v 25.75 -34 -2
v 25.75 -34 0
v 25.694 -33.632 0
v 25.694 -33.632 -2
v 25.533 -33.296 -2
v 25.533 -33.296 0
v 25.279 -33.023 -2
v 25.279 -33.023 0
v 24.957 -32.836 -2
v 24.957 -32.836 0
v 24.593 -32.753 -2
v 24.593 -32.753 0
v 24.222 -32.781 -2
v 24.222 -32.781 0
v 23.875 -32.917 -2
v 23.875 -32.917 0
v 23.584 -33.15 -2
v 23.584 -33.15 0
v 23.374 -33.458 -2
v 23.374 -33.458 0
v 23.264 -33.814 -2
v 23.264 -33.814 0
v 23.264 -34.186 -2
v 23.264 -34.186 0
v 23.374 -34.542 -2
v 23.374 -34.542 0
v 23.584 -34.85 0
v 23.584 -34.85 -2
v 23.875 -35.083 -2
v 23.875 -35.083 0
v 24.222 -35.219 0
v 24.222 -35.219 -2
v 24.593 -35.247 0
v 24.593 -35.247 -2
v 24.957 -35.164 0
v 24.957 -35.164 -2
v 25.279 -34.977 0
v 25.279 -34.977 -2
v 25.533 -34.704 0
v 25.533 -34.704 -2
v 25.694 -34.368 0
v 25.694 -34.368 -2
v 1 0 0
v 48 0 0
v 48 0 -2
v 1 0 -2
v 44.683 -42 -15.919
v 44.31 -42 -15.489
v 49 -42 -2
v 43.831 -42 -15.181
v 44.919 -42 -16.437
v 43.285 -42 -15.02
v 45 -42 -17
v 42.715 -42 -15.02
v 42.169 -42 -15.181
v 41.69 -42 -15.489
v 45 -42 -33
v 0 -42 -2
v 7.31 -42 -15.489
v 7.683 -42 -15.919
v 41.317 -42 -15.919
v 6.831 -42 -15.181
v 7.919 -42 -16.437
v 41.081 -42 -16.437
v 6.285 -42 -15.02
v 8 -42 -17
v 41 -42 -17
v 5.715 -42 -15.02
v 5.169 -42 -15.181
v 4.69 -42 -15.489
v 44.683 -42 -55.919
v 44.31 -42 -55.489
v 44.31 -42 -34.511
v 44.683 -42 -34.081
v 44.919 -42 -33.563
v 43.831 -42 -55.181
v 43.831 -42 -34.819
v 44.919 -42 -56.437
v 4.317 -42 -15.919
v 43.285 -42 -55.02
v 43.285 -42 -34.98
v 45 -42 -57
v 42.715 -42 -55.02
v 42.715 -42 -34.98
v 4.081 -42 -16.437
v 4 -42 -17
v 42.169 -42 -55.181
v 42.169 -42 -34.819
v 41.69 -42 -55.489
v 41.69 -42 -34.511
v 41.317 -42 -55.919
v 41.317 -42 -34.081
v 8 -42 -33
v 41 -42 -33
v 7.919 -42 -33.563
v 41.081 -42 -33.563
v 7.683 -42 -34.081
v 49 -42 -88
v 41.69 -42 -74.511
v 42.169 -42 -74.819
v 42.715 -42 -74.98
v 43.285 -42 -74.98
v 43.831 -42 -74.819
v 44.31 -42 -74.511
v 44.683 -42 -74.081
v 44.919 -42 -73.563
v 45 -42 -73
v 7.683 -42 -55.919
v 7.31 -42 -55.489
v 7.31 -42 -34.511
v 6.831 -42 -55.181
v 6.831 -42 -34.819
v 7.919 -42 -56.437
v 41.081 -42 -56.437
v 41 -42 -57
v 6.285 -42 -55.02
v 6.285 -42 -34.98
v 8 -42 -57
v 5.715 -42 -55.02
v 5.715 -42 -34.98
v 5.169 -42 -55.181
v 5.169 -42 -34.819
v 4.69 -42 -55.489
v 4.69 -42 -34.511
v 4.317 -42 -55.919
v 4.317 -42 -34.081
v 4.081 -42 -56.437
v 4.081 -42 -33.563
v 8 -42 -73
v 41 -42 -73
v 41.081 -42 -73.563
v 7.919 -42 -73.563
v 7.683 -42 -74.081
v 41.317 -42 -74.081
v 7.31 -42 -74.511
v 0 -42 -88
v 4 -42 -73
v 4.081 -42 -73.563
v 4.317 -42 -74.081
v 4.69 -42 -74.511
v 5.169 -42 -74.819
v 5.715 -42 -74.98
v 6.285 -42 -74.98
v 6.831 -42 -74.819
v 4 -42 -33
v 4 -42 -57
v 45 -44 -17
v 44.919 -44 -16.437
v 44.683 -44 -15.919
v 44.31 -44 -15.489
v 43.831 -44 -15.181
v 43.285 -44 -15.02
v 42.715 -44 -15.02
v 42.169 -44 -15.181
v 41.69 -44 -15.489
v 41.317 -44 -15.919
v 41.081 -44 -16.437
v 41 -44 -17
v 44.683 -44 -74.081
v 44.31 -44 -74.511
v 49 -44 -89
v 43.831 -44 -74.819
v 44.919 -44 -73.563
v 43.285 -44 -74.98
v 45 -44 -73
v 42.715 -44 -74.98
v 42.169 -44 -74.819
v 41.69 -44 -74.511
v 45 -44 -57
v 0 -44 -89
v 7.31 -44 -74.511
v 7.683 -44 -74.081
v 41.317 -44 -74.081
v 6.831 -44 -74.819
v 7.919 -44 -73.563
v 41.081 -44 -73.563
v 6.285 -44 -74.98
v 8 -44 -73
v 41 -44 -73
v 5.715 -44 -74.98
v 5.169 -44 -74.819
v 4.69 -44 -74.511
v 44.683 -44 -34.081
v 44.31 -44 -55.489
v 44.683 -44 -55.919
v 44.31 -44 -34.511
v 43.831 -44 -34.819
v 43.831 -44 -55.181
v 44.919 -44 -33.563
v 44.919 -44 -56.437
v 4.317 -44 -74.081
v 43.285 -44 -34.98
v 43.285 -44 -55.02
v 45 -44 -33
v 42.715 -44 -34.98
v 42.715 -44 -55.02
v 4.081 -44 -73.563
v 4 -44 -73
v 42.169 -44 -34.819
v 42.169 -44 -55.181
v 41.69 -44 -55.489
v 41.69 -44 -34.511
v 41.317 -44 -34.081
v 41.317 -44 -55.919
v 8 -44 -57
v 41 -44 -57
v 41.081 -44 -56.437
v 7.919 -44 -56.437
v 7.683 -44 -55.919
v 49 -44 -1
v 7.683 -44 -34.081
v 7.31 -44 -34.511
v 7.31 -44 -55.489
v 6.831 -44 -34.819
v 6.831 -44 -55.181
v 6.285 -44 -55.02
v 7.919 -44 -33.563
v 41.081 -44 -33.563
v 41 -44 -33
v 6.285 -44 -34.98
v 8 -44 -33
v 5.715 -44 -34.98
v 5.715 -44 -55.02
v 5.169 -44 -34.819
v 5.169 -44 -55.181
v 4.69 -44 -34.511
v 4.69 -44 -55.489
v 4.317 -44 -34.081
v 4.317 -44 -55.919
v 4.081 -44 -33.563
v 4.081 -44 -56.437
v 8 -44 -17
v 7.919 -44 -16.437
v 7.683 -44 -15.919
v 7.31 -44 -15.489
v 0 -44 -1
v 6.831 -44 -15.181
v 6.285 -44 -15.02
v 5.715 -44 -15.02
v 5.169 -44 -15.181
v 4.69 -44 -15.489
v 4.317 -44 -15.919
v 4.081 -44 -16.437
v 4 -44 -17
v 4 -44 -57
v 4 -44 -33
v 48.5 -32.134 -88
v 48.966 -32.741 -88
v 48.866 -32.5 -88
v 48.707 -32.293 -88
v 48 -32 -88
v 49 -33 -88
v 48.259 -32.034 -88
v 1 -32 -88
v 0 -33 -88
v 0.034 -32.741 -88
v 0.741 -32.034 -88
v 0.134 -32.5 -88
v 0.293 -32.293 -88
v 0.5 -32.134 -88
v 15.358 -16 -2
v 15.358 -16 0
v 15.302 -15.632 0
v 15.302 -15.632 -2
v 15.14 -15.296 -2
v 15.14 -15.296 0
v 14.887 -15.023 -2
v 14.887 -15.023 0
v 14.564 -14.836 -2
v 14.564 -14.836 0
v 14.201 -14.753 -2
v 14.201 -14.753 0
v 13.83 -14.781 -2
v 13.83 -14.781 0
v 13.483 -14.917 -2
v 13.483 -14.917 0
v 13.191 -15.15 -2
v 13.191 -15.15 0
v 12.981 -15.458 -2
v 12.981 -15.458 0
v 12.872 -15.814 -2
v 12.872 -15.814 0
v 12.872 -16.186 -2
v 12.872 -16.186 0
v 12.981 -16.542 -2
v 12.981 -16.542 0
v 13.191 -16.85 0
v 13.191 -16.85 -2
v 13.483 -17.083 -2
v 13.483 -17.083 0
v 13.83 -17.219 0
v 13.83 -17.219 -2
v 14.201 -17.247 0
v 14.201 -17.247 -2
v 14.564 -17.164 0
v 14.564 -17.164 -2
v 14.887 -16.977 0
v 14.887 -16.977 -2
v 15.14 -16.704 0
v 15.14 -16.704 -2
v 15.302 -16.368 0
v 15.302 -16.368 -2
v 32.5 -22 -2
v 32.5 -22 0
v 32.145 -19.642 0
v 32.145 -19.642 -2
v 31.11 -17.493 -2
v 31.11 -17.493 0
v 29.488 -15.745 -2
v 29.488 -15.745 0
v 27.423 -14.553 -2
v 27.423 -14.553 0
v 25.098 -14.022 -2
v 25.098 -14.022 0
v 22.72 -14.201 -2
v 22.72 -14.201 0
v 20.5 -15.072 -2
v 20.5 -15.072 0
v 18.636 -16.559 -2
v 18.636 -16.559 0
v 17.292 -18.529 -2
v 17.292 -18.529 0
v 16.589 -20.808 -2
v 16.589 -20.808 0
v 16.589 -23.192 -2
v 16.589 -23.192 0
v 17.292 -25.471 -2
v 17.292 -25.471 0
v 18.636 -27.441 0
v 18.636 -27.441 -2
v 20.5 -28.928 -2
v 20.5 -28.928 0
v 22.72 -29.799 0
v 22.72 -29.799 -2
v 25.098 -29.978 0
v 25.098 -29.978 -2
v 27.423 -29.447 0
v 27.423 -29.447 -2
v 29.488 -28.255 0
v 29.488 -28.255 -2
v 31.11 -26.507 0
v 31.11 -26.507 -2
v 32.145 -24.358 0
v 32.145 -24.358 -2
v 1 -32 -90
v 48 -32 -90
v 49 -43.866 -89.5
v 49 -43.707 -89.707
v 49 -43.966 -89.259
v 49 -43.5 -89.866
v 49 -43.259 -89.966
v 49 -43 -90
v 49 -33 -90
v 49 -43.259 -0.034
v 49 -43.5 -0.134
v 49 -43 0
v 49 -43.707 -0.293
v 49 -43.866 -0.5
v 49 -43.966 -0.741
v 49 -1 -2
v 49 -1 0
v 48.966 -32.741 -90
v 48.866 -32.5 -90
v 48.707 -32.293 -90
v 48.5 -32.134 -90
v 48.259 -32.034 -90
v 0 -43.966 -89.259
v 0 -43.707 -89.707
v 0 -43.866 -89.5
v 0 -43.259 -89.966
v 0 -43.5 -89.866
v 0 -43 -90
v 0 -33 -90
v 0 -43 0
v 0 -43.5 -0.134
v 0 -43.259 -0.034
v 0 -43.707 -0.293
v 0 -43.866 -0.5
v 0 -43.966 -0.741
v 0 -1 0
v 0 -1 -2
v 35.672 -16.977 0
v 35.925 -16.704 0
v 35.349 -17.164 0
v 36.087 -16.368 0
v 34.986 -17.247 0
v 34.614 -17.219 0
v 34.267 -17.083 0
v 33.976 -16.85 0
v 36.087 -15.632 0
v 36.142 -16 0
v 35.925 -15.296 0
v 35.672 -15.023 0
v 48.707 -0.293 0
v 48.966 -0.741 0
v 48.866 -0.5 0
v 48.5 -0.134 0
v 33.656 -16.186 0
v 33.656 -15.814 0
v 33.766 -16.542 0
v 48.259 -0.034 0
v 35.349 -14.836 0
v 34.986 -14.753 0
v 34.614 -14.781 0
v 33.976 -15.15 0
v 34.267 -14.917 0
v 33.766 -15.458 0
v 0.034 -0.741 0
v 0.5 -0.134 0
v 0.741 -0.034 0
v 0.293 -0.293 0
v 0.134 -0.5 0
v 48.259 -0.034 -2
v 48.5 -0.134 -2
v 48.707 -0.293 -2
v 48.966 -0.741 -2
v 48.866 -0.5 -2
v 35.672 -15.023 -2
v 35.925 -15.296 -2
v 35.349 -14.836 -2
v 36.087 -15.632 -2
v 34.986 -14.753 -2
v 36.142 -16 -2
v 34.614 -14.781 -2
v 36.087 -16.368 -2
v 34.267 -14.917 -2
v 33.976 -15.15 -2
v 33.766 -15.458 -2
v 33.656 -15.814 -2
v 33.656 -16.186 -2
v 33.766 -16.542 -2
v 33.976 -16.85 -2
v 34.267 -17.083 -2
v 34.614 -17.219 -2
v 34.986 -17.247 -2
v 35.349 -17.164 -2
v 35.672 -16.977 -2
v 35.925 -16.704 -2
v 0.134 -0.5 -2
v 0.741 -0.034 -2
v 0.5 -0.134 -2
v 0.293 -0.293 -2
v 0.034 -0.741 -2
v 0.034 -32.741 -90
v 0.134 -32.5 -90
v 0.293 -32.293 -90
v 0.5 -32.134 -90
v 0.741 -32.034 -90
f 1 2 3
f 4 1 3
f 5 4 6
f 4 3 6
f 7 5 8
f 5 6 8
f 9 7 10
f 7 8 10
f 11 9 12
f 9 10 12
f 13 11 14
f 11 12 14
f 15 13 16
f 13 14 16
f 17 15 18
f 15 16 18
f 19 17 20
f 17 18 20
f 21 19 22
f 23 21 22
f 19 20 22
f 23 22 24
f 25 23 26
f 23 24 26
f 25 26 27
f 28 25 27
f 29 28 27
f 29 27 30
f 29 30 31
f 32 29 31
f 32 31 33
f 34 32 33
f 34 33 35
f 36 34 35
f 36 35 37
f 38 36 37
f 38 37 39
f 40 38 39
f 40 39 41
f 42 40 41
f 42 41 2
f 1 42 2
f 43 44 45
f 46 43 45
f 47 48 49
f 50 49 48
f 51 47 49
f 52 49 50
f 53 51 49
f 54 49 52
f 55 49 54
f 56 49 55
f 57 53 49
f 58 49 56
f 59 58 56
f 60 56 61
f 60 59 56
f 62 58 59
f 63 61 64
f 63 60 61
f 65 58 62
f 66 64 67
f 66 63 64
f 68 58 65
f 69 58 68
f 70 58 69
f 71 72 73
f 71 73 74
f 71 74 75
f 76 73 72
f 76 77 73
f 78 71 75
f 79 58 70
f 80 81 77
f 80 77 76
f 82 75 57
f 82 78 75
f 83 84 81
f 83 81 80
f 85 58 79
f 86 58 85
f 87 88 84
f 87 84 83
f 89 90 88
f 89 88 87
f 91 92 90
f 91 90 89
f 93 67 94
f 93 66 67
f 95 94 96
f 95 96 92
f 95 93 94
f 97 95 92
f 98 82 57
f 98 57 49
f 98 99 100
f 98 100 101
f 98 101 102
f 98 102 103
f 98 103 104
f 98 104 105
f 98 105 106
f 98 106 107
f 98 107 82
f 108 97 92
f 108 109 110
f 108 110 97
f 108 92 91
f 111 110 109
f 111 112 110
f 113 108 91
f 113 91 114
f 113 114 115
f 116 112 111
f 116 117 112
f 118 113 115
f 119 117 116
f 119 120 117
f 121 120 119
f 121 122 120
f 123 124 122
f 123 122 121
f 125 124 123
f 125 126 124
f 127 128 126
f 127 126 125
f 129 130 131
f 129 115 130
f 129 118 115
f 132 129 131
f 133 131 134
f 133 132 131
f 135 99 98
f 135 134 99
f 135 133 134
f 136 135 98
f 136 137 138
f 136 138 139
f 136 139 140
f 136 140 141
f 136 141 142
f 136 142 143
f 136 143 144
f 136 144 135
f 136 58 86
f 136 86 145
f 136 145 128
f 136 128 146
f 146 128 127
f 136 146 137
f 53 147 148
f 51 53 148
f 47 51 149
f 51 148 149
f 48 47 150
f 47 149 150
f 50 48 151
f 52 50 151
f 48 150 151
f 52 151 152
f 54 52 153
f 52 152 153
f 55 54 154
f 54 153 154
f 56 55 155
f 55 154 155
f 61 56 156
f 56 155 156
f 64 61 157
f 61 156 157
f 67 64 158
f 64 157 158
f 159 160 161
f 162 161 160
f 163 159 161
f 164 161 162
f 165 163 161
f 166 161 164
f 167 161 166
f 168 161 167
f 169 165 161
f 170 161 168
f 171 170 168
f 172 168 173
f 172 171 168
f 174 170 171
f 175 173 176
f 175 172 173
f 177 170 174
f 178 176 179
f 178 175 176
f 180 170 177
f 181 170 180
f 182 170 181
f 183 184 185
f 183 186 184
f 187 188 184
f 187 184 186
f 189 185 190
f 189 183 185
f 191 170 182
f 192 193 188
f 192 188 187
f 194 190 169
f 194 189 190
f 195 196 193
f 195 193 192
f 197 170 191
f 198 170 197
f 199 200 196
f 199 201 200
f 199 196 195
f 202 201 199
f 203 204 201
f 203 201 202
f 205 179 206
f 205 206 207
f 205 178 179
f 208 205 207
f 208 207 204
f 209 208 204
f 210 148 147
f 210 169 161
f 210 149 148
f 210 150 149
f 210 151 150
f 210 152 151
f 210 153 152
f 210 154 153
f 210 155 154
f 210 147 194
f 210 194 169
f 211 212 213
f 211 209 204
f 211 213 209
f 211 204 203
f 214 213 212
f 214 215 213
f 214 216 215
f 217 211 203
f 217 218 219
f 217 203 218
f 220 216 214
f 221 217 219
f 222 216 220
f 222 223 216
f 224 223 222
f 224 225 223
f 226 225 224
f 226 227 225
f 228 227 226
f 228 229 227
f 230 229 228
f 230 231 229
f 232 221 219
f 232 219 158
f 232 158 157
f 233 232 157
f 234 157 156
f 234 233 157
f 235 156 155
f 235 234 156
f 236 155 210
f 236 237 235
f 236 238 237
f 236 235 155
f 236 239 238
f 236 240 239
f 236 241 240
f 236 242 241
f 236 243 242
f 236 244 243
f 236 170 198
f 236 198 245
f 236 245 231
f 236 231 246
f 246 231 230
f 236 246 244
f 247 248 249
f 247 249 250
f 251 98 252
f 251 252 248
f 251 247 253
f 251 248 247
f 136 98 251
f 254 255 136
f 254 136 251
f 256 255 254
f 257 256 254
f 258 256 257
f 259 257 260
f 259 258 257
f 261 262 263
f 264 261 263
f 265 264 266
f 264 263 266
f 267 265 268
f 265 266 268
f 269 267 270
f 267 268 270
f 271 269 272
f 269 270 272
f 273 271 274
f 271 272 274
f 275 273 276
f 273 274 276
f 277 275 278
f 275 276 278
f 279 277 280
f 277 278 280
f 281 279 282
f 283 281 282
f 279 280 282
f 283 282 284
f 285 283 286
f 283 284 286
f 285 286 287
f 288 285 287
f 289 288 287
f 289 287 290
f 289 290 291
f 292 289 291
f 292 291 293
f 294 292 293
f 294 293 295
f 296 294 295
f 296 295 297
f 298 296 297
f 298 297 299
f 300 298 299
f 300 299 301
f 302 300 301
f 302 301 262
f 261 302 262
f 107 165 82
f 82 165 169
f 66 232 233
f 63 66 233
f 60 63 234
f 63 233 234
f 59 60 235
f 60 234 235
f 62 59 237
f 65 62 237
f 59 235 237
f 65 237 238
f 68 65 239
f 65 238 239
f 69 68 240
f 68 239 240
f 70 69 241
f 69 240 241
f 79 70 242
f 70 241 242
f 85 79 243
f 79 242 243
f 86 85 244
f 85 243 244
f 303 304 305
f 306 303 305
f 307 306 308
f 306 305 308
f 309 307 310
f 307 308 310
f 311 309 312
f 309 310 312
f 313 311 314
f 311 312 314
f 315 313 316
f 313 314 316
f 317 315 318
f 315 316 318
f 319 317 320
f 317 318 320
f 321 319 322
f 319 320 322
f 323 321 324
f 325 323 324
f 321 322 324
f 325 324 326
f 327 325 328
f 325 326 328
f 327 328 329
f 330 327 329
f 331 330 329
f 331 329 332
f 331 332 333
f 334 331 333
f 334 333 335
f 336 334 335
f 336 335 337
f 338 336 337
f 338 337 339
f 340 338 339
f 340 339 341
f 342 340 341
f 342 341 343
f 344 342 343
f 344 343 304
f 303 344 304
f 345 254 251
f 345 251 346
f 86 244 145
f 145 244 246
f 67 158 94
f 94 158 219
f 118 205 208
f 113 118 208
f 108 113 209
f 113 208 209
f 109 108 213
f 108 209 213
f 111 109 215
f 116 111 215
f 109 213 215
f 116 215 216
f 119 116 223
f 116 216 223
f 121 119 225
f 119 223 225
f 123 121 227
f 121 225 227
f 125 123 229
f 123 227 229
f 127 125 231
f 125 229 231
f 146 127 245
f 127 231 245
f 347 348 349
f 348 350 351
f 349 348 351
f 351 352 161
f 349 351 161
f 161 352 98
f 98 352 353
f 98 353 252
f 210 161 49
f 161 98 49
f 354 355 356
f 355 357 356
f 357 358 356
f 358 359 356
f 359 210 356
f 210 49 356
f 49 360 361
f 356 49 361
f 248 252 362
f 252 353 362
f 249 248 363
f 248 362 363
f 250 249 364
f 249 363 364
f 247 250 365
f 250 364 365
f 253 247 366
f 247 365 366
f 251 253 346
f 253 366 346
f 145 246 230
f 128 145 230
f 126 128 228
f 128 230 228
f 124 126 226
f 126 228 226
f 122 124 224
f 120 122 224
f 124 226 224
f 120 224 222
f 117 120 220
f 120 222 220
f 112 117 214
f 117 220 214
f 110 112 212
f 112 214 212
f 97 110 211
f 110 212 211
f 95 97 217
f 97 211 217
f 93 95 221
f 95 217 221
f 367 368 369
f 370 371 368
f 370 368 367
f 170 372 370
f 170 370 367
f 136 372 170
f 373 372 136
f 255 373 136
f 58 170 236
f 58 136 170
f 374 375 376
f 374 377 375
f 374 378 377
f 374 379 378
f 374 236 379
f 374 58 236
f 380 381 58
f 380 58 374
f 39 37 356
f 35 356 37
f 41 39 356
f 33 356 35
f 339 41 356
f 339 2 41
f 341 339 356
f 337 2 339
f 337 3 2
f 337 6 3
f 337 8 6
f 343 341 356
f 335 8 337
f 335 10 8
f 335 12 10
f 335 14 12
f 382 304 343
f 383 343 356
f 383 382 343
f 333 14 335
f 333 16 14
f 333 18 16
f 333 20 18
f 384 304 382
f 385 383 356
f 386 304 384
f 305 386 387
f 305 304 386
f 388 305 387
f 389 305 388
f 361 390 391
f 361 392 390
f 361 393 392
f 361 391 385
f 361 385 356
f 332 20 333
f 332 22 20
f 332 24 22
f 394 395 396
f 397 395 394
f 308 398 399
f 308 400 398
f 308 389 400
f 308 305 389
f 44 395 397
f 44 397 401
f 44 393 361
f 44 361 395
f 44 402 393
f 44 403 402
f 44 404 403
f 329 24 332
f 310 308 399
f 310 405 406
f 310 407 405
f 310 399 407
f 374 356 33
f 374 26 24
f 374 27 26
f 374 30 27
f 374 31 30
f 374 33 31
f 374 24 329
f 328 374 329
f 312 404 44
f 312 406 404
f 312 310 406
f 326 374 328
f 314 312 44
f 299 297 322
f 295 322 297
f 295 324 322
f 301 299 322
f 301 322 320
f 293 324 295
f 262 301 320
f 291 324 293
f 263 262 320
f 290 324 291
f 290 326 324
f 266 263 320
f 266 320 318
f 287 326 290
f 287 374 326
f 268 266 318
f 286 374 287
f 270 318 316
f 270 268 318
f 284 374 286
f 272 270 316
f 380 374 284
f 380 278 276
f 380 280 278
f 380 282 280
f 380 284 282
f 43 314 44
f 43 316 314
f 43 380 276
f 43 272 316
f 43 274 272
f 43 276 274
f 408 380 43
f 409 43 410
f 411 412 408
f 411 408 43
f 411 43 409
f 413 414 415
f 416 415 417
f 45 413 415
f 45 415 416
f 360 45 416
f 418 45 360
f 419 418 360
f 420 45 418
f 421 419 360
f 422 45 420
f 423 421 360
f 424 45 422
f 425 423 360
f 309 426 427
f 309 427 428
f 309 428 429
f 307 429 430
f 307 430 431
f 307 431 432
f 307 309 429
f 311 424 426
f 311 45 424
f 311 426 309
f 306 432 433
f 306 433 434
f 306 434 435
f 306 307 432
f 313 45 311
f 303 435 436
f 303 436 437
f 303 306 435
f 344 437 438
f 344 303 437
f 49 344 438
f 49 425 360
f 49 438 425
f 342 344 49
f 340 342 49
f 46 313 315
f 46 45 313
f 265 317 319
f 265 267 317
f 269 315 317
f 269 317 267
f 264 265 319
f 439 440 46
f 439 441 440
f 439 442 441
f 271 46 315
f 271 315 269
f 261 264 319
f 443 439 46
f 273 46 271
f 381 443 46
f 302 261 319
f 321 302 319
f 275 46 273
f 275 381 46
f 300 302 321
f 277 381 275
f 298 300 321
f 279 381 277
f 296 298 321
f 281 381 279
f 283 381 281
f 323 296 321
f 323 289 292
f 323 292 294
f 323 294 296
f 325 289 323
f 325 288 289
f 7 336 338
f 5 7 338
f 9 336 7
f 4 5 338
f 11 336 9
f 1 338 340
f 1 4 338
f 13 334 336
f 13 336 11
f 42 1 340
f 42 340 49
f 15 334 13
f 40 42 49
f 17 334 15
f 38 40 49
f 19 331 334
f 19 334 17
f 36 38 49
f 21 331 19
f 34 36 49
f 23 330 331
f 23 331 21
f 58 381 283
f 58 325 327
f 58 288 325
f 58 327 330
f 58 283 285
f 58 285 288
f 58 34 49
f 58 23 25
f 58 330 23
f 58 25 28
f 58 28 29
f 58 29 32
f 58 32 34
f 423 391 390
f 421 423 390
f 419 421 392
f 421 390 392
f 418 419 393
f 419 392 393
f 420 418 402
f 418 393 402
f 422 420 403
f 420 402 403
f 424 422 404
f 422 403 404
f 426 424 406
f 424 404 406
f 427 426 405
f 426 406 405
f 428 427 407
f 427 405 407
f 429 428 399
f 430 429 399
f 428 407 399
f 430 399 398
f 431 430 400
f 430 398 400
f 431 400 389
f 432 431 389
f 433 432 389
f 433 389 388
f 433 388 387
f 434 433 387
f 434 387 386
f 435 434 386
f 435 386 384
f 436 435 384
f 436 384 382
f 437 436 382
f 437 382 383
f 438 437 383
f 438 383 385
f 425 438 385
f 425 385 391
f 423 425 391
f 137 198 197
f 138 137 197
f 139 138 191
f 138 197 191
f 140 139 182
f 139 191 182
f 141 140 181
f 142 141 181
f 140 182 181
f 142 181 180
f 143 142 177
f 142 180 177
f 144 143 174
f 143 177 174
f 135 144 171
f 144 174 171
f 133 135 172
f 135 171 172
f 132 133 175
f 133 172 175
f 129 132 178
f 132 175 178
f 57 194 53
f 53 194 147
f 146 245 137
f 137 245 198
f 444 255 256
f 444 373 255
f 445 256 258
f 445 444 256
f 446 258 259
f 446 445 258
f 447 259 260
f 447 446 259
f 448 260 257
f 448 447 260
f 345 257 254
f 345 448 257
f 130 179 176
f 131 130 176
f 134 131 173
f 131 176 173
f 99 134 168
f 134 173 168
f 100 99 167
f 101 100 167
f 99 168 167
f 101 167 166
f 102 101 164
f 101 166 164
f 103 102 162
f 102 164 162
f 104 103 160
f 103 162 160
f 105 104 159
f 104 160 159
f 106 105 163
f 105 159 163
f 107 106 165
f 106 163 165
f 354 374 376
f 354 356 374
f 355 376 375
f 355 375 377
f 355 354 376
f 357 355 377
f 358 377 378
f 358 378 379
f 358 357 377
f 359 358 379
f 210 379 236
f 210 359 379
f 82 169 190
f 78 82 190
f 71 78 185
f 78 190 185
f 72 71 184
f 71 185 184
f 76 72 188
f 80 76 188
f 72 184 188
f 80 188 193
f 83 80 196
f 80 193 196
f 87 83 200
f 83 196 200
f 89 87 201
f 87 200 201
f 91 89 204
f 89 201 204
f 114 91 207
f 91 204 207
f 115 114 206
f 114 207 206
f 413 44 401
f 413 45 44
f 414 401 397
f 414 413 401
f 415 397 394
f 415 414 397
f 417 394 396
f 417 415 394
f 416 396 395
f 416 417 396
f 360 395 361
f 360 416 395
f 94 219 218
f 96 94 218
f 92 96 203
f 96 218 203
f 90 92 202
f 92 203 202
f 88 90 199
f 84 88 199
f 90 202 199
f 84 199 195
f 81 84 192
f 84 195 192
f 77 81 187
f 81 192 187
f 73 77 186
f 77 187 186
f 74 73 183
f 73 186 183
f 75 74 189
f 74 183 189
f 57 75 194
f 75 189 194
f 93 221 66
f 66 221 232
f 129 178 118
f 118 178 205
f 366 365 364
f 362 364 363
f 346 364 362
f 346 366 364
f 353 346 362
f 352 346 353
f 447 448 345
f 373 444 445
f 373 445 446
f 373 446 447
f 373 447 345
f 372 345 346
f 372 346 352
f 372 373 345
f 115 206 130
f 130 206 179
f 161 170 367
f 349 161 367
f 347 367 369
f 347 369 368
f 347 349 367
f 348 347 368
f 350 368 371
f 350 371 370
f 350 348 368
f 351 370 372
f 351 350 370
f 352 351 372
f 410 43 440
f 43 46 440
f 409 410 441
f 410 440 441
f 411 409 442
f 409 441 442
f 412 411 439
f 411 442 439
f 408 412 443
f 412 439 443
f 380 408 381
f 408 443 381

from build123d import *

# Parameters (mm, degrees)
BOSS_EXTRUDE2_DEPTH = 49
CUT_EXTRUDE1_REACH  = 113.521
SKETCH4_R           = 1.25
SKETCH4_R_2         = 8
CUT_EXTRUDE3_REACH  = 113.521
FILLET2_R           = 1


with BuildPart() as part:
    # Sketch3 → Boss-Extrude2 (new body)
    with BuildSketch(Plane(origin=(0, 0, 0), x_dir=(0, 0, -1), z_dir=(1, 0, 0))):
        Polygon((0, 0), (2, 0), (2, -42), (88, -42), (88, -32), (90, -32), (90, -44), (0, -44), align=None)
    extrude(amount=BOSS_EXTRUDE2_DEPTH)

    # Sketch4 → Cut-Extrude1 (cut, up to next)
    with BuildSketch(Plane.XY, mode=Mode.PRIVATE) as cut_extrude1_sk1:
        with Locations((24.5, -34)):
            Circle(SKETCH4_R)
    cut_extrude1_tool1 = extrude(cut_extrude1_sk1.sketch, amount=-CUT_EXTRUDE1_REACH, mode=Mode.PRIVATE) & part.part
    # Sketch4 → Cut-Extrude1 (cut, up to next)
    with BuildSketch(Plane.XY, mode=Mode.PRIVATE) as cut_extrude1_sk2:
        with Locations((14.107695155, -16)):
            Circle(SKETCH4_R)
    cut_extrude1_tool2 = extrude(cut_extrude1_sk2.sketch, amount=-CUT_EXTRUDE1_REACH, mode=Mode.PRIVATE) & part.part
    # Sketch4 → Cut-Extrude1 (cut, up to next)
    with BuildSketch(Plane.XY, mode=Mode.PRIVATE) as cut_extrude1_sk3:
        with Locations((34.892304845, -16)):
            Circle(SKETCH4_R)
    cut_extrude1_tool3 = extrude(cut_extrude1_sk3.sketch, amount=-CUT_EXTRUDE1_REACH, mode=Mode.PRIVATE) & part.part
    # Sketch4 → Cut-Extrude1 (cut, up to next)
    with BuildSketch(Plane.XY, mode=Mode.PRIVATE) as cut_extrude1_sk4:
        with Locations((24.5, -22)):
            Circle(SKETCH4_R_2)
    cut_extrude1_tool4 = extrude(cut_extrude1_sk4.sketch, amount=-CUT_EXTRUDE1_REACH, mode=Mode.PRIVATE) & part.part
    add(cut_extrude1_tool1.solids().sort_by_distance((24.5, -34, 0))[0], mode=Mode.SUBTRACT)
    add(cut_extrude1_tool2.solids().sort_by_distance((14.107695, -16, 0))[0], mode=Mode.SUBTRACT)
    add(cut_extrude1_tool3.solids().sort_by_distance((34.892305, -16, 0))[0], mode=Mode.SUBTRACT)
    add(cut_extrude1_tool4.solids().sort_by_distance((24.5, -22, 0))[0], mode=Mode.SUBTRACT)

    # Sketch5 → Cut-Extrude3 (cut, up to next)
    with BuildSketch(Plane.XZ.offset(44), mode=Mode.PRIVATE) as cut_extrude3_sk1:
        with BuildLine():
            Line((41, -17), (41, -33))
            ThreePointArc((41, -33), (43, -35), (45, -33))
            Line((45, -33), (45, -17))
            ThreePointArc((45, -17), (43, -15), (41, -17))
        make_face()
    cut_extrude3_tool1 = extrude(cut_extrude3_sk1.sketch, amount=-CUT_EXTRUDE3_REACH, mode=Mode.PRIVATE) & part.part
    # Sketch5 → Cut-Extrude3 (cut, up to next)
    with BuildSketch(Plane.XZ.offset(44), mode=Mode.PRIVATE) as cut_extrude3_sk2:
        with BuildLine():
            Line((45, -73), (45, -57))
            ThreePointArc((45, -57), (43, -55), (41, -57))
            Line((41, -57), (41, -73))
            ThreePointArc((41, -73), (43, -75), (45, -73))
        make_face()
    cut_extrude3_tool2 = extrude(cut_extrude3_sk2.sketch, amount=-CUT_EXTRUDE3_REACH, mode=Mode.PRIVATE) & part.part
    # Sketch5 → Cut-Extrude3 (cut, up to next)
    with BuildSketch(Plane.XZ.offset(44), mode=Mode.PRIVATE) as cut_extrude3_sk3:
        with BuildLine():
            Line((8, -73), (8, -57))
            ThreePointArc((8, -57), (6, -55), (4, -57))
            Line((4, -57), (4, -73))
            ThreePointArc((4, -73), (6, -75), (8, -73))
        make_face()
    cut_extrude3_tool3 = extrude(cut_extrude3_sk3.sketch, amount=-CUT_EXTRUDE3_REACH, mode=Mode.PRIVATE) & part.part
    # Sketch5 → Cut-Extrude3 (cut, up to next)
    with BuildSketch(Plane.XZ.offset(44), mode=Mode.PRIVATE) as cut_extrude3_sk4:
        with BuildLine():
            Line((4, -17), (4, -33))
            ThreePointArc((4, -33), (6, -35), (8, -33))
            Line((8, -33), (8, -17))
            ThreePointArc((8, -17), (6, -15), (4, -17))
        make_face()
    cut_extrude3_tool4 = extrude(cut_extrude3_sk4.sketch, amount=-CUT_EXTRUDE3_REACH, mode=Mode.PRIVATE) & part.part
    add(cut_extrude3_tool1.solids().sort_by_distance((43, -44, -25))[0], mode=Mode.SUBTRACT)
    add(cut_extrude3_tool2.solids().sort_by_distance((43, -44, -65))[0], mode=Mode.SUBTRACT)
    add(cut_extrude3_tool3.solids().sort_by_distance((6, -44, -65))[0], mode=Mode.SUBTRACT)
    add(cut_extrude3_tool4.solids().sort_by_distance((6, -44, -25))[0], mode=Mode.SUBTRACT)

    # Fillet2
    fillet2_edges = [part.edges().sort_by_distance(p)[0] for p in [
        (0, 0, -1),
        (24.5, -44, 0),
        (24.5, -44, -90),
        (49, -32, -89),
        (49, 0, -1),
        (0, -32, -89),
    ]]
    fillet(fillet2_edges, radius=FILLET2_R)


solid = part.part
